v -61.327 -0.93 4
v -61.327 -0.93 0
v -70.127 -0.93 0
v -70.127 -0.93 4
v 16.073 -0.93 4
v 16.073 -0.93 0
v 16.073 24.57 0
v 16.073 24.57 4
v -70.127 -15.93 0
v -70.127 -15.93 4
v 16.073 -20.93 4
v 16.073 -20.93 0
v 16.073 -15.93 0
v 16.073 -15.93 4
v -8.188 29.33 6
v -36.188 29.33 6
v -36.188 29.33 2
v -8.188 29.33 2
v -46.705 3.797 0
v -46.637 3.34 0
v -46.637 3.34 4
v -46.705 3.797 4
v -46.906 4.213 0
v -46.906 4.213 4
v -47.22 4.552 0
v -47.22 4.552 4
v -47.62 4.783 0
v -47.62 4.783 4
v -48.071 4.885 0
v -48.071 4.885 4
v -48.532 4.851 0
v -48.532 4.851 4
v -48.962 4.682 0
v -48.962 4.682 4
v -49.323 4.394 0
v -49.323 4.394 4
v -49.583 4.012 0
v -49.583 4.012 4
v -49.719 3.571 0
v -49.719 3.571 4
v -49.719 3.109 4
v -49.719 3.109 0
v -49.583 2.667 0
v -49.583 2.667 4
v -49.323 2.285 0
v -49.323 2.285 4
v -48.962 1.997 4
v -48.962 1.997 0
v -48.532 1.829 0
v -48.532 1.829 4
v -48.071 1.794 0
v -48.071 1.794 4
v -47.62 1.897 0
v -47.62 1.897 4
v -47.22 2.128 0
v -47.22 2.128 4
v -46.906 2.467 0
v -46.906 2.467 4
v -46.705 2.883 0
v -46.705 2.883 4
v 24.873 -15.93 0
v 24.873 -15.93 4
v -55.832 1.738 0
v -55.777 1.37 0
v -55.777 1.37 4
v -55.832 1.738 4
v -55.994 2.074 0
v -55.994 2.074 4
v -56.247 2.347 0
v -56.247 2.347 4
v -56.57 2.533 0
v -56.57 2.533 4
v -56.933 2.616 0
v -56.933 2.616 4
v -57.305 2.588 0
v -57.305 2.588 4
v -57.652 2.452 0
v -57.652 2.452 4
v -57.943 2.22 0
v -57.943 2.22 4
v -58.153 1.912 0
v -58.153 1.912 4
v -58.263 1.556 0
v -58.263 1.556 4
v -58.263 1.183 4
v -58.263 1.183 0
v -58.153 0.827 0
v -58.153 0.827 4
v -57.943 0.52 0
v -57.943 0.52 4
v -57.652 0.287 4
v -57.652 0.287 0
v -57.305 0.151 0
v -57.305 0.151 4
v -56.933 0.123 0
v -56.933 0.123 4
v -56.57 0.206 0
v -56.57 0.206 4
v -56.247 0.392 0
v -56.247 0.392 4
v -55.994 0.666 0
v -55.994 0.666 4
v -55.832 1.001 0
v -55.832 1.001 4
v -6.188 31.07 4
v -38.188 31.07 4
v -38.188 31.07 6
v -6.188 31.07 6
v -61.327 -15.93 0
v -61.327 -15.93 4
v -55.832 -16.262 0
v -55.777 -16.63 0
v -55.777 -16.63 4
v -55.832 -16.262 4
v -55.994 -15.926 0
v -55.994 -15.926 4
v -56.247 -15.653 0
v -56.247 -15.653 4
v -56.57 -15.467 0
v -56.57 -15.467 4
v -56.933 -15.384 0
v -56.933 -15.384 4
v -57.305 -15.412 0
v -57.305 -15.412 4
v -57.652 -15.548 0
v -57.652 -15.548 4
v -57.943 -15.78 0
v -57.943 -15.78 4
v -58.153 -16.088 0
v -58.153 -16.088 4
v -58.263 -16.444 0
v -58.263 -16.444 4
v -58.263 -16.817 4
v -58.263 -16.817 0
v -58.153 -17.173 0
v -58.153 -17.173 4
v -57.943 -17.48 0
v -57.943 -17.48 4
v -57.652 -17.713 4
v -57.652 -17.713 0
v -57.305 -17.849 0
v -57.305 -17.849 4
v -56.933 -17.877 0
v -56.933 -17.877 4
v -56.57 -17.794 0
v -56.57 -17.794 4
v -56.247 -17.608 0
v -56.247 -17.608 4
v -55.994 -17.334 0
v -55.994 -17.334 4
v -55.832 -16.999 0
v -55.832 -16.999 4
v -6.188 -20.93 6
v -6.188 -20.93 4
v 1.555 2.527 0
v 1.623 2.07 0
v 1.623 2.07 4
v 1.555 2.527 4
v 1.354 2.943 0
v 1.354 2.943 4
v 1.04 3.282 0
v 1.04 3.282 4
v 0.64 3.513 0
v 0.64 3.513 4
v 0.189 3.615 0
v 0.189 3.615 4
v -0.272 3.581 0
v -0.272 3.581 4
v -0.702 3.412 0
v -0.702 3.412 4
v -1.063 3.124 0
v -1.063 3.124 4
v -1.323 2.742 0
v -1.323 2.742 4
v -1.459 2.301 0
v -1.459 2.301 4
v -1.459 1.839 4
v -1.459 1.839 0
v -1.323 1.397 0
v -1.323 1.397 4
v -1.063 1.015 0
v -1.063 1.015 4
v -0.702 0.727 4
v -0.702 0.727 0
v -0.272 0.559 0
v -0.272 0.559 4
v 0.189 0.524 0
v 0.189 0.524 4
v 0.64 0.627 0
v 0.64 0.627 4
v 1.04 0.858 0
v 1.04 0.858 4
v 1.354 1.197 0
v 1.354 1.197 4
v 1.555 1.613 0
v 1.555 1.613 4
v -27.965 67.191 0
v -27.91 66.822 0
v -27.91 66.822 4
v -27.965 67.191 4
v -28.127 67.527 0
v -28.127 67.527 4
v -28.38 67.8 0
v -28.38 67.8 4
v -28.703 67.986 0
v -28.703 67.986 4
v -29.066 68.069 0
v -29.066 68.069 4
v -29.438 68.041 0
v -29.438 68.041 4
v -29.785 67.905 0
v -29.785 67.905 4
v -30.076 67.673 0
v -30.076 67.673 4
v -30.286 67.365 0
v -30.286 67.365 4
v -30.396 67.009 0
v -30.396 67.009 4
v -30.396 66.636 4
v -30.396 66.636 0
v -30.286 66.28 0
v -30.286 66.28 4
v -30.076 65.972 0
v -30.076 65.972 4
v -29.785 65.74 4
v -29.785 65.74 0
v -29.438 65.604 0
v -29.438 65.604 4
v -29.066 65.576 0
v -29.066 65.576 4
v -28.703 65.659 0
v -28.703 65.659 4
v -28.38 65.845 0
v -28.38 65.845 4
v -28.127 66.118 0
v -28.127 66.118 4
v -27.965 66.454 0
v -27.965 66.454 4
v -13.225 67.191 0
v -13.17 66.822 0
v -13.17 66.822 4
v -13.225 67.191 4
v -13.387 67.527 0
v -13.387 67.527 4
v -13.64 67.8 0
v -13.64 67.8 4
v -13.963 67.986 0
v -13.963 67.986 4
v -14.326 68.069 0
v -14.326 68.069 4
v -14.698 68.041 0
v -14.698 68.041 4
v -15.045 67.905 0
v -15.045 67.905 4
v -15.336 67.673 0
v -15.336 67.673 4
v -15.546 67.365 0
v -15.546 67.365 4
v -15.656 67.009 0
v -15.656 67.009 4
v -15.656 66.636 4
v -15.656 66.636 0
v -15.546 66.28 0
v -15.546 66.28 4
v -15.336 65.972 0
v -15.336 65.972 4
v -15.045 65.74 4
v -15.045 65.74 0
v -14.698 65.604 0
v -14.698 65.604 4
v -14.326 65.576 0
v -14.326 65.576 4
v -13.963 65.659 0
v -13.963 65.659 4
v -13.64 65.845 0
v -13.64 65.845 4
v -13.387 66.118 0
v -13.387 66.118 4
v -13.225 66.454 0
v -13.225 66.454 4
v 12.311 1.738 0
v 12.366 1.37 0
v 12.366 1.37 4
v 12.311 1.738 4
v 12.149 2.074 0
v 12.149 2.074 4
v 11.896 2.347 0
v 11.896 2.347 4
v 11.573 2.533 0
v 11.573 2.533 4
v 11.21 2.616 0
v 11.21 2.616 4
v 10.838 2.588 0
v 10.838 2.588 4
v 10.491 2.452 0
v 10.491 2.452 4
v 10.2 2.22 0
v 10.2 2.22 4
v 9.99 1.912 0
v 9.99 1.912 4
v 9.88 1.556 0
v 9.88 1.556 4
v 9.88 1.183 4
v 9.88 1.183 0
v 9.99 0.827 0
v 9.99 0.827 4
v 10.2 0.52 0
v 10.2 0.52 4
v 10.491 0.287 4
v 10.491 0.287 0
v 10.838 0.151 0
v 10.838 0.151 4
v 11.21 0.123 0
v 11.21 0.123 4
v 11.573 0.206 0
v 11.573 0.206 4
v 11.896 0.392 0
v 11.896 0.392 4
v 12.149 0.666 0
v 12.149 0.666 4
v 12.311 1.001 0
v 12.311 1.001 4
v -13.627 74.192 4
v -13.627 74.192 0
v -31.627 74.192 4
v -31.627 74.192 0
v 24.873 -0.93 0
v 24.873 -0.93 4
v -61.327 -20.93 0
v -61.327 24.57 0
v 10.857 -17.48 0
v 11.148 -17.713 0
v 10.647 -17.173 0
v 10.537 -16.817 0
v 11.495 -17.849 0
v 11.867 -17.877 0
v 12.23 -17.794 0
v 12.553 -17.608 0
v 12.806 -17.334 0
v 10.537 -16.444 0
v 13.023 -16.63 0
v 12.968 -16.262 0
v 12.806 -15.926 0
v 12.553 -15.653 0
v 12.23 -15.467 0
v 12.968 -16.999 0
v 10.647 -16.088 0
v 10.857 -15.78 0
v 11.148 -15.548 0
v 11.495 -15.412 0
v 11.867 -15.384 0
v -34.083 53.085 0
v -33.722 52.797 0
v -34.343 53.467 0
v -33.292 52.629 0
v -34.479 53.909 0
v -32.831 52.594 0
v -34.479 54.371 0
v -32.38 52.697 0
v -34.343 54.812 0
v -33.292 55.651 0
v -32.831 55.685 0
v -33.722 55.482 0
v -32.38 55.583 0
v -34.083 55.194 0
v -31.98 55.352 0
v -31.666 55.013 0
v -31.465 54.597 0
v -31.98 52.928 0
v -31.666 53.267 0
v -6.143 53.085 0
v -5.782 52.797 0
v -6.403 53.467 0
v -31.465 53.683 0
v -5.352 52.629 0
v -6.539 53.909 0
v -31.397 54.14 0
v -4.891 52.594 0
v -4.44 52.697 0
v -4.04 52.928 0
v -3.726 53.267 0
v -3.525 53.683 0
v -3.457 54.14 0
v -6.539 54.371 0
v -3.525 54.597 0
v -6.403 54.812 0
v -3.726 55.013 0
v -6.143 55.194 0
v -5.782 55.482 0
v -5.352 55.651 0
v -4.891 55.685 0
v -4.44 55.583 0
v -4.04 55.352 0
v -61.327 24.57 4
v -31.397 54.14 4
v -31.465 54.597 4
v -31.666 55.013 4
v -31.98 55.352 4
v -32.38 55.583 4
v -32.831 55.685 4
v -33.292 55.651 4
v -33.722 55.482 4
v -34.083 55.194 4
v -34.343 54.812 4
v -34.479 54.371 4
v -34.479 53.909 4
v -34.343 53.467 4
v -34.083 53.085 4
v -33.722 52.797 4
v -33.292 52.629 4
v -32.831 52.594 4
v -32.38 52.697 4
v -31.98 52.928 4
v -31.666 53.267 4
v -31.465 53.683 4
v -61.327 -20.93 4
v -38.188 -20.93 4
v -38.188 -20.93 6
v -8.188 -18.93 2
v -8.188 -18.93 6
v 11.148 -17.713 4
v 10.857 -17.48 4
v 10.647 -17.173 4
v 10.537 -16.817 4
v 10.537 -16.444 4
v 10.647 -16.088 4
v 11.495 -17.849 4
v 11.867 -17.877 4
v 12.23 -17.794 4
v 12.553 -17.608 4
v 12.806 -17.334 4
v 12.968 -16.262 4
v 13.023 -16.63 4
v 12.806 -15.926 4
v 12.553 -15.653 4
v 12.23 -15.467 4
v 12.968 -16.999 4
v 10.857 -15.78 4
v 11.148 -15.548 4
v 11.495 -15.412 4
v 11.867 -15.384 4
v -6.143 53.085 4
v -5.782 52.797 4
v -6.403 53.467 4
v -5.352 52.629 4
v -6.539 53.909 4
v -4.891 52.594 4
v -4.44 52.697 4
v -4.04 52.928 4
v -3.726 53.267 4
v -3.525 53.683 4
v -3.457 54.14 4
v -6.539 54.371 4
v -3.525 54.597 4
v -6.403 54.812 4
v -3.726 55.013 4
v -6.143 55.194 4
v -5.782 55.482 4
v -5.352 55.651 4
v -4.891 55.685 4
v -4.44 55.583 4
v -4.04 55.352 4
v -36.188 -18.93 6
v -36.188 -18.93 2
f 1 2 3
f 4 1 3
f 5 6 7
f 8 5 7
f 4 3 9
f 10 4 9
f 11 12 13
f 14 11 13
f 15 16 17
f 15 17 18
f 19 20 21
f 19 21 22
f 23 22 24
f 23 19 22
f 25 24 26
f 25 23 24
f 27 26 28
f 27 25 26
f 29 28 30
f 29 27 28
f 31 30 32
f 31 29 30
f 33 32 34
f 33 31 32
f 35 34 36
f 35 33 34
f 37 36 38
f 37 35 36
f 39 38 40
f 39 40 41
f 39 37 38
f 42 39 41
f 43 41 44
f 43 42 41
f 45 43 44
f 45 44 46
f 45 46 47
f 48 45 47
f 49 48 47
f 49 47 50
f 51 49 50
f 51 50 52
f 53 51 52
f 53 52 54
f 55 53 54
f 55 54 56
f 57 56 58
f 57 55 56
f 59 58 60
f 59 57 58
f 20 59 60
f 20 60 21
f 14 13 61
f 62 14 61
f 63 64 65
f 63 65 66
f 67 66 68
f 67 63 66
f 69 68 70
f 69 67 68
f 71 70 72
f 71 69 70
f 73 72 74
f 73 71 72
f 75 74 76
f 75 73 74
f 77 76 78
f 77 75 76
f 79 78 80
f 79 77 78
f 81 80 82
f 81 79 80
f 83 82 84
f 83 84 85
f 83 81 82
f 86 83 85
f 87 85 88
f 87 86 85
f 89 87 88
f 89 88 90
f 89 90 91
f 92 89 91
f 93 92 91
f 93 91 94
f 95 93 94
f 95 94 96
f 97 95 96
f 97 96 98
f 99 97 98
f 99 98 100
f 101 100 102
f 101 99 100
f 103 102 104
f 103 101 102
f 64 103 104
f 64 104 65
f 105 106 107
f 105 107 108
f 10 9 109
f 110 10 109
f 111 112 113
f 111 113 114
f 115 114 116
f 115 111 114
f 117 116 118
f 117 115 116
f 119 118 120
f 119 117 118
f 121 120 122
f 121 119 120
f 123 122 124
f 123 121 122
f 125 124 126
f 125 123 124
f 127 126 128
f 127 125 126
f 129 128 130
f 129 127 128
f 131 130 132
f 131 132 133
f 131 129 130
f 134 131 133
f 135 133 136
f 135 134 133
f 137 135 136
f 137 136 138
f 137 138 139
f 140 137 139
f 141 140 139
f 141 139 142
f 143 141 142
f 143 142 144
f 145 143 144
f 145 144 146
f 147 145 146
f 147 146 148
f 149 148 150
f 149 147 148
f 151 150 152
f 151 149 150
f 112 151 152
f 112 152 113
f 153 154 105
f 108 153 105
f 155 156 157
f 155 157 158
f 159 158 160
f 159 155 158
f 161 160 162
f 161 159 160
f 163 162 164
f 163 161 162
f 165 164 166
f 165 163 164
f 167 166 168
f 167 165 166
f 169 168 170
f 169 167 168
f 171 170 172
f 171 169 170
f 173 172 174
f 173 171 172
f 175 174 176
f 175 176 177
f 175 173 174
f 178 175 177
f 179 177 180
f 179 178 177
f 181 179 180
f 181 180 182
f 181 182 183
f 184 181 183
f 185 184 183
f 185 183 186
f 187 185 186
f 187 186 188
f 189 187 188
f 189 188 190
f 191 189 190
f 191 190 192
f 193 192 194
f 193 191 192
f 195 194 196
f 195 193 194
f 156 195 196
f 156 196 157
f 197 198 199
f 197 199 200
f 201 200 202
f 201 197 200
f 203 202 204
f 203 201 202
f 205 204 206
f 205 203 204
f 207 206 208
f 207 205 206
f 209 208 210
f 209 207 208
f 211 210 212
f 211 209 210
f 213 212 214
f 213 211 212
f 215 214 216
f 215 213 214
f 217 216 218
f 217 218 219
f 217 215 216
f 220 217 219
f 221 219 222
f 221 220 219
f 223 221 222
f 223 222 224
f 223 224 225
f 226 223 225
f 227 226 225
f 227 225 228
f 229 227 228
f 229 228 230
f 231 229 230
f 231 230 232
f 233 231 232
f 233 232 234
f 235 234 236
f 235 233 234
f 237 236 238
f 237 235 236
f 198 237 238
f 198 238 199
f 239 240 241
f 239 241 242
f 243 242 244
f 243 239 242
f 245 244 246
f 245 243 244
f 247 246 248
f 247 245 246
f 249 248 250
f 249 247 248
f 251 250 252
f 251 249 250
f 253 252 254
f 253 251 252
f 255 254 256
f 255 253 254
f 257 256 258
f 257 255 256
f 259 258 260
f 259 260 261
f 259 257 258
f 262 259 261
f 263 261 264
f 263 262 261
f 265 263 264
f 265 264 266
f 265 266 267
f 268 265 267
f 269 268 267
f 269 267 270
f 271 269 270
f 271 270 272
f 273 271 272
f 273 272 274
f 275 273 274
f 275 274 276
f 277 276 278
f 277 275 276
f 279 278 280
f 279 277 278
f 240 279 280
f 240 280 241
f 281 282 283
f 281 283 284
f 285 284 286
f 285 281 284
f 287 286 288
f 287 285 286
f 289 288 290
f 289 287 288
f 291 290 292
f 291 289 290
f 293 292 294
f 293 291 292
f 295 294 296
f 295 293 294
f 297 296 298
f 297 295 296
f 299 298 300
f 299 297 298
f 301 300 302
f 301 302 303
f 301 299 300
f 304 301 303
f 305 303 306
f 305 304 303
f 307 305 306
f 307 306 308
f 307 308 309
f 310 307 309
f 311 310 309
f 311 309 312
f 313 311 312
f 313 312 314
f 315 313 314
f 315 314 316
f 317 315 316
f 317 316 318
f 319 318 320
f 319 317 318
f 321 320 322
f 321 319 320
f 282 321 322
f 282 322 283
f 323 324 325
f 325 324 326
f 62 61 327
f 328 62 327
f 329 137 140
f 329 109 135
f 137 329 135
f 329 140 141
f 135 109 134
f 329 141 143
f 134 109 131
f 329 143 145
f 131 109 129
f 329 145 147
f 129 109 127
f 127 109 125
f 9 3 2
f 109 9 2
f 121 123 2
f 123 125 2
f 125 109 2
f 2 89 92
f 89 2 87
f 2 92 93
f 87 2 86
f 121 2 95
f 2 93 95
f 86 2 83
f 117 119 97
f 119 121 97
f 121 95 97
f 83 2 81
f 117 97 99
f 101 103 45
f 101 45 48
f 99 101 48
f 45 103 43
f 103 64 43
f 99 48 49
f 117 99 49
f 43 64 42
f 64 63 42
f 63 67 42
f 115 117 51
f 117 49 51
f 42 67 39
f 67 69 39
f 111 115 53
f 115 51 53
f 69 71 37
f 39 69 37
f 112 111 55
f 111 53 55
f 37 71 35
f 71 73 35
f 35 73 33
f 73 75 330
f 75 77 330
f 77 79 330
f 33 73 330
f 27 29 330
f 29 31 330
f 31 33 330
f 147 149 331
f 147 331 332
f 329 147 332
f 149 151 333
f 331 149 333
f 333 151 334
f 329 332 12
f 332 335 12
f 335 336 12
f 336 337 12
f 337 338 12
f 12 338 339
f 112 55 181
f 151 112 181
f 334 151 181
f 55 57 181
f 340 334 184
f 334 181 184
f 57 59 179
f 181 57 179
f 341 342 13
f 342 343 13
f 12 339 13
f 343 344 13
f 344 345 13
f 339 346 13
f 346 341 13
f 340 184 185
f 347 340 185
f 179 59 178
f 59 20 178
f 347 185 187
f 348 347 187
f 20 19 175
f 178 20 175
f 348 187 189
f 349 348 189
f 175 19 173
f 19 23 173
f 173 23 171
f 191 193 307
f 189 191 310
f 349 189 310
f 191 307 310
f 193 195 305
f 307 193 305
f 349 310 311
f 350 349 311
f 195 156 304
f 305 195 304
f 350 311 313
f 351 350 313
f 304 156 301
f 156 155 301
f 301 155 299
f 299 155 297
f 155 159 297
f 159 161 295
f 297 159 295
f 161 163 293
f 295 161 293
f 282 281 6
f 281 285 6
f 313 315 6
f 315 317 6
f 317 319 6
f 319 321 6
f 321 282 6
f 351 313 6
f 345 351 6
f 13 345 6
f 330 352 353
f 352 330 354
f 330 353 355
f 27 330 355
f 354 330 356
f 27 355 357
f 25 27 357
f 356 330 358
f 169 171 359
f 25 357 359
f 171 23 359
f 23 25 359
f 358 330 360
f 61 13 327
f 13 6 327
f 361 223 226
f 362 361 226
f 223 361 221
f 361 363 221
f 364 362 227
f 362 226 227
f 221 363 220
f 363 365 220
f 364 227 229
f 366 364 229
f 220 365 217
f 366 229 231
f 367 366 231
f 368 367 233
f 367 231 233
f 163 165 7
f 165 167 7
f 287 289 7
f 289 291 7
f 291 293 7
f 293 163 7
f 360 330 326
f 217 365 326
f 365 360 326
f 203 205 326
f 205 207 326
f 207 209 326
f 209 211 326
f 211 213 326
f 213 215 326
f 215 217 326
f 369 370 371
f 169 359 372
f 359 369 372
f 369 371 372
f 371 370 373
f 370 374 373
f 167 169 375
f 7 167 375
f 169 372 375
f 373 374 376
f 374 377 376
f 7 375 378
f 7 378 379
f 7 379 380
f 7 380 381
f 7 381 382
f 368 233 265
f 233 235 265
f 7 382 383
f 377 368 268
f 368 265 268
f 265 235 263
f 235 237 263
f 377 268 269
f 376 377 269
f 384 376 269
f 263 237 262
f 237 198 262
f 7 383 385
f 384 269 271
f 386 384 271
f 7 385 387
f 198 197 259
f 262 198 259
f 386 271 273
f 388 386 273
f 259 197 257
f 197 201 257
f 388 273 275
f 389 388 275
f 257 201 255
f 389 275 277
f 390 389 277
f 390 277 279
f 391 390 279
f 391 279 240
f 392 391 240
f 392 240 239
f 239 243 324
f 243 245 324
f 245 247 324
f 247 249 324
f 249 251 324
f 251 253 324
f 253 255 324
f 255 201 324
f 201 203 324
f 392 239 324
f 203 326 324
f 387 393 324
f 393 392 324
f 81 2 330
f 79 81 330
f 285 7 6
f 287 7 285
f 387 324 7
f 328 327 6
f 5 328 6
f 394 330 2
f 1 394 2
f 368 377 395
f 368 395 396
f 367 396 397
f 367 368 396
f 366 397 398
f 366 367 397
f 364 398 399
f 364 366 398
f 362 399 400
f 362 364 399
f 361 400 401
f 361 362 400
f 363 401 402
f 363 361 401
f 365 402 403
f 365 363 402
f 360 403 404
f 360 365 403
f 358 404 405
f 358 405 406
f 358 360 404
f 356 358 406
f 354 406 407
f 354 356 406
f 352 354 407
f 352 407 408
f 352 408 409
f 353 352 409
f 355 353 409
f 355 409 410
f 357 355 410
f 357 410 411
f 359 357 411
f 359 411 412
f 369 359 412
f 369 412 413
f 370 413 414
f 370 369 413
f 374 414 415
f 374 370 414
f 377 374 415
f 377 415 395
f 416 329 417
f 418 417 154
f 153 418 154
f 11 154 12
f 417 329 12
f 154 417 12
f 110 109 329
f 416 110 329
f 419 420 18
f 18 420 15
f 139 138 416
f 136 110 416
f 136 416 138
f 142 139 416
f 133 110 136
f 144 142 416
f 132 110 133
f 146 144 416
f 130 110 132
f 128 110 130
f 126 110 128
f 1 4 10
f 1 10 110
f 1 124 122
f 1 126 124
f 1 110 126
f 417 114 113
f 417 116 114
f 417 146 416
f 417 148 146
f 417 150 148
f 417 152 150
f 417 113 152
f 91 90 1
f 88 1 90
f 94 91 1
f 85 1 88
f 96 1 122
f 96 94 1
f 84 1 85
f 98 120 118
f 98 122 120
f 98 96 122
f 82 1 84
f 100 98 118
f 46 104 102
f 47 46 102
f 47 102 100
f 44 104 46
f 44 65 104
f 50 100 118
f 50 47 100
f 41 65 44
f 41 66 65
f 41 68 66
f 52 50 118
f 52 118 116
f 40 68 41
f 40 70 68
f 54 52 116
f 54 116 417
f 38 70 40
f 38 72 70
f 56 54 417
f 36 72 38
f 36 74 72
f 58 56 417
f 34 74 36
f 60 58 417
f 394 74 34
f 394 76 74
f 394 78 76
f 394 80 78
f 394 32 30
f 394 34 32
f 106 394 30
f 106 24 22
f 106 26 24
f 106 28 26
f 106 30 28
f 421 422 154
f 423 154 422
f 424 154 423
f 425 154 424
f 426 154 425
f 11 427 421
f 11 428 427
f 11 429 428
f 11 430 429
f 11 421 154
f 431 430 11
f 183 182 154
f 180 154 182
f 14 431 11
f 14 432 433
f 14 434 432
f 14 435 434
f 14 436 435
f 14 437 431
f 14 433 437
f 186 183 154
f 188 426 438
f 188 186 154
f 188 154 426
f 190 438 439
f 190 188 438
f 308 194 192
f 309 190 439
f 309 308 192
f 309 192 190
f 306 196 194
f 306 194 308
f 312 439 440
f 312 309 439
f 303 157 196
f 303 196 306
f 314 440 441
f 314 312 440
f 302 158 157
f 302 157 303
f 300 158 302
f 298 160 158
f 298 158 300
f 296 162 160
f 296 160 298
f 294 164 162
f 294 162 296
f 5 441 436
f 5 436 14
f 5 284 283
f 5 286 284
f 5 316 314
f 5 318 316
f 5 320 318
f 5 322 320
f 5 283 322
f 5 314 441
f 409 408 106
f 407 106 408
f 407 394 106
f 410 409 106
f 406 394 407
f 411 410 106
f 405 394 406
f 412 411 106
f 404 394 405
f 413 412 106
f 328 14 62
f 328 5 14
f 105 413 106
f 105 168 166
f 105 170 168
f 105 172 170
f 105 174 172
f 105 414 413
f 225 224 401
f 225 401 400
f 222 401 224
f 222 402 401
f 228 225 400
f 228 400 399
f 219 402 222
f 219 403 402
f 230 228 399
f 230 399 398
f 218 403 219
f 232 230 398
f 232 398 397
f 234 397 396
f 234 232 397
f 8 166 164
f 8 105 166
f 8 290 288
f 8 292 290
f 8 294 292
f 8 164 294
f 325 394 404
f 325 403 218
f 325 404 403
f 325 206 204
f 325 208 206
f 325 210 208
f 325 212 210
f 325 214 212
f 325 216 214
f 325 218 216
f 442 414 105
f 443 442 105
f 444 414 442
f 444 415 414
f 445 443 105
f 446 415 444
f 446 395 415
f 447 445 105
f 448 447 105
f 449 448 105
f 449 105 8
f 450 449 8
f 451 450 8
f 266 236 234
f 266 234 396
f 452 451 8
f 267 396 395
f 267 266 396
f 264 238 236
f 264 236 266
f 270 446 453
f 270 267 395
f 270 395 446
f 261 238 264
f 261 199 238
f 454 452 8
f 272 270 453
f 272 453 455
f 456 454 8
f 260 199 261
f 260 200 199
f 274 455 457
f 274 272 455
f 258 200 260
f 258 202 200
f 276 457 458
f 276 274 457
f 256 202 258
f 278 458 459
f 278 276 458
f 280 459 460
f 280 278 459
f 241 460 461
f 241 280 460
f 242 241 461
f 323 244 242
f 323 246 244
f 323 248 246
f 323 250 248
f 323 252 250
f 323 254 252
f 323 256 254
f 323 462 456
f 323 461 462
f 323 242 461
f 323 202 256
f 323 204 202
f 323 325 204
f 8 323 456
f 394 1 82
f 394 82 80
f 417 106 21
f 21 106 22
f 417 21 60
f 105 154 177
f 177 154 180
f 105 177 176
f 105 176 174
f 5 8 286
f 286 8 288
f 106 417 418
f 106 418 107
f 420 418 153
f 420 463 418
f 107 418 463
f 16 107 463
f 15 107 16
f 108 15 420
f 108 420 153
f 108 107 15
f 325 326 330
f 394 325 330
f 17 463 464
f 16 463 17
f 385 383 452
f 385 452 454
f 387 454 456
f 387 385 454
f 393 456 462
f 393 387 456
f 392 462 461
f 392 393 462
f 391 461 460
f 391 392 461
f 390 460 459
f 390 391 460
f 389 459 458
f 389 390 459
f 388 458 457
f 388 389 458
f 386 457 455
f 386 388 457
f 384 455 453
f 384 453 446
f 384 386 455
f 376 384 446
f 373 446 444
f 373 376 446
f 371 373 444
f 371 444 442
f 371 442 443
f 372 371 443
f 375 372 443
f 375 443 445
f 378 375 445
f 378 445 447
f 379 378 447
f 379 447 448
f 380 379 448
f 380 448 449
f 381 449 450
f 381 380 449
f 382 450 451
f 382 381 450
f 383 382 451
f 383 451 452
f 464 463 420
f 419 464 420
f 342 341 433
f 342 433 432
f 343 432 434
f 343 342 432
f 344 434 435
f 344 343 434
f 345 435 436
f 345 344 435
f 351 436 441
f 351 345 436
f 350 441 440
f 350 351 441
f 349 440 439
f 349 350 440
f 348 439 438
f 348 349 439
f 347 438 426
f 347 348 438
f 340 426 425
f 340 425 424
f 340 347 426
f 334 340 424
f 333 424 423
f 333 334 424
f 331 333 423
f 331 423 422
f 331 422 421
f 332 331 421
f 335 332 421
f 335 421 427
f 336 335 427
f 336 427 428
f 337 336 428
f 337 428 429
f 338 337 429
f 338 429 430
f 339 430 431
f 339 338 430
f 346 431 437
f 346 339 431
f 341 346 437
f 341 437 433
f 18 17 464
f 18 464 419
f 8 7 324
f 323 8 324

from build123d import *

# Parameters (mm, degrees)
F0_R     = 1.25
F0_R_2   = 1.55
F1_DEPTH = 4
F6_W     = 32
F6_H     = 52
F7_DEPTH = 2
F8_W     = 28
F8_H     = 48.26
F9_DEPTH = 4


with BuildPart() as f1:
    # F0 (on Top) → F1 (new body)
    with BuildSketch(Plane.XY):
        Polygon((-13.626695, 74.19249), (-31.626695, 74.19249), (-61.326636, 24.569767), (-61.326636, -0.930233), (-70.126636, -0.930233), (-70.126636, -15.930233), (-61.326636, -15.930233), (-61.326636, -20.930233), (16.073364, -20.930233), (16.073364, -15.930233), (24.873364, -15.930233), (24.873364, -0.930233), (16.073246, -0.930233), (16.073246, 24.569767), align=None)
        with Locations((-57.026636, -16.630233)):
            Circle(F0_R, mode=Mode.SUBTRACT)
        with Locations((-57.026636, 1.369767)):
            Circle(F0_R, mode=Mode.SUBTRACT)
        with Locations((-48.186636, 3.339767)):
            Circle(F0_R_2, mode=Mode.SUBTRACT)
        with Locations((0.073364, 2.069767)):
            Circle(F0_R_2, mode=Mode.SUBTRACT)
        with Locations((11.773364, -16.630233)):
            Circle(F0_R, mode=Mode.SUBTRACT)
        with Locations((11.116156, 1.369767)):
            Circle(F0_R, mode=Mode.SUBTRACT)
        with Locations((-32.946636, 54.139767)):
            Circle(F0_R_2, mode=Mode.SUBTRACT)
        with Locations((-29.159842, 66.82249)):
            Circle(F0_R, mode=Mode.SUBTRACT)
        with Locations((-5.006636, 54.139767)):
            Circle(F0_R_2, mode=Mode.SUBTRACT)
        with Locations((-14.419842, 66.82249)):
            Circle(F0_R, mode=Mode.SUBTRACT)
    extrude(amount=F1_DEPTH)

    # F6 (on face) → F7 (join)
    with BuildSketch(Plane.XY.offset(4)):
        with Locations((-22.18772, 5.069767)):
            Rectangle(F6_W, F6_H)
    extrude(amount=F7_DEPTH)

    # F8 (on face) → F9 (cut)
    with BuildSketch(Plane.XY.offset(6)):
        with Locations((-22.18772, 5.199767)):
            Rectangle(F8_W, F8_H)
    extrude(amount=-F9_DEPTH, mode=Mode.SUBTRACT)


with BuildPart() as f2_1:
    # F2: copy of F1
    add(f1.part.moved(Location((0, 0, 7))))


with BuildPart() as f4_1:
    # F4: copy of F1
    add(f1.part.moved(Location((0, 0, 6))))


solid = f1.part
